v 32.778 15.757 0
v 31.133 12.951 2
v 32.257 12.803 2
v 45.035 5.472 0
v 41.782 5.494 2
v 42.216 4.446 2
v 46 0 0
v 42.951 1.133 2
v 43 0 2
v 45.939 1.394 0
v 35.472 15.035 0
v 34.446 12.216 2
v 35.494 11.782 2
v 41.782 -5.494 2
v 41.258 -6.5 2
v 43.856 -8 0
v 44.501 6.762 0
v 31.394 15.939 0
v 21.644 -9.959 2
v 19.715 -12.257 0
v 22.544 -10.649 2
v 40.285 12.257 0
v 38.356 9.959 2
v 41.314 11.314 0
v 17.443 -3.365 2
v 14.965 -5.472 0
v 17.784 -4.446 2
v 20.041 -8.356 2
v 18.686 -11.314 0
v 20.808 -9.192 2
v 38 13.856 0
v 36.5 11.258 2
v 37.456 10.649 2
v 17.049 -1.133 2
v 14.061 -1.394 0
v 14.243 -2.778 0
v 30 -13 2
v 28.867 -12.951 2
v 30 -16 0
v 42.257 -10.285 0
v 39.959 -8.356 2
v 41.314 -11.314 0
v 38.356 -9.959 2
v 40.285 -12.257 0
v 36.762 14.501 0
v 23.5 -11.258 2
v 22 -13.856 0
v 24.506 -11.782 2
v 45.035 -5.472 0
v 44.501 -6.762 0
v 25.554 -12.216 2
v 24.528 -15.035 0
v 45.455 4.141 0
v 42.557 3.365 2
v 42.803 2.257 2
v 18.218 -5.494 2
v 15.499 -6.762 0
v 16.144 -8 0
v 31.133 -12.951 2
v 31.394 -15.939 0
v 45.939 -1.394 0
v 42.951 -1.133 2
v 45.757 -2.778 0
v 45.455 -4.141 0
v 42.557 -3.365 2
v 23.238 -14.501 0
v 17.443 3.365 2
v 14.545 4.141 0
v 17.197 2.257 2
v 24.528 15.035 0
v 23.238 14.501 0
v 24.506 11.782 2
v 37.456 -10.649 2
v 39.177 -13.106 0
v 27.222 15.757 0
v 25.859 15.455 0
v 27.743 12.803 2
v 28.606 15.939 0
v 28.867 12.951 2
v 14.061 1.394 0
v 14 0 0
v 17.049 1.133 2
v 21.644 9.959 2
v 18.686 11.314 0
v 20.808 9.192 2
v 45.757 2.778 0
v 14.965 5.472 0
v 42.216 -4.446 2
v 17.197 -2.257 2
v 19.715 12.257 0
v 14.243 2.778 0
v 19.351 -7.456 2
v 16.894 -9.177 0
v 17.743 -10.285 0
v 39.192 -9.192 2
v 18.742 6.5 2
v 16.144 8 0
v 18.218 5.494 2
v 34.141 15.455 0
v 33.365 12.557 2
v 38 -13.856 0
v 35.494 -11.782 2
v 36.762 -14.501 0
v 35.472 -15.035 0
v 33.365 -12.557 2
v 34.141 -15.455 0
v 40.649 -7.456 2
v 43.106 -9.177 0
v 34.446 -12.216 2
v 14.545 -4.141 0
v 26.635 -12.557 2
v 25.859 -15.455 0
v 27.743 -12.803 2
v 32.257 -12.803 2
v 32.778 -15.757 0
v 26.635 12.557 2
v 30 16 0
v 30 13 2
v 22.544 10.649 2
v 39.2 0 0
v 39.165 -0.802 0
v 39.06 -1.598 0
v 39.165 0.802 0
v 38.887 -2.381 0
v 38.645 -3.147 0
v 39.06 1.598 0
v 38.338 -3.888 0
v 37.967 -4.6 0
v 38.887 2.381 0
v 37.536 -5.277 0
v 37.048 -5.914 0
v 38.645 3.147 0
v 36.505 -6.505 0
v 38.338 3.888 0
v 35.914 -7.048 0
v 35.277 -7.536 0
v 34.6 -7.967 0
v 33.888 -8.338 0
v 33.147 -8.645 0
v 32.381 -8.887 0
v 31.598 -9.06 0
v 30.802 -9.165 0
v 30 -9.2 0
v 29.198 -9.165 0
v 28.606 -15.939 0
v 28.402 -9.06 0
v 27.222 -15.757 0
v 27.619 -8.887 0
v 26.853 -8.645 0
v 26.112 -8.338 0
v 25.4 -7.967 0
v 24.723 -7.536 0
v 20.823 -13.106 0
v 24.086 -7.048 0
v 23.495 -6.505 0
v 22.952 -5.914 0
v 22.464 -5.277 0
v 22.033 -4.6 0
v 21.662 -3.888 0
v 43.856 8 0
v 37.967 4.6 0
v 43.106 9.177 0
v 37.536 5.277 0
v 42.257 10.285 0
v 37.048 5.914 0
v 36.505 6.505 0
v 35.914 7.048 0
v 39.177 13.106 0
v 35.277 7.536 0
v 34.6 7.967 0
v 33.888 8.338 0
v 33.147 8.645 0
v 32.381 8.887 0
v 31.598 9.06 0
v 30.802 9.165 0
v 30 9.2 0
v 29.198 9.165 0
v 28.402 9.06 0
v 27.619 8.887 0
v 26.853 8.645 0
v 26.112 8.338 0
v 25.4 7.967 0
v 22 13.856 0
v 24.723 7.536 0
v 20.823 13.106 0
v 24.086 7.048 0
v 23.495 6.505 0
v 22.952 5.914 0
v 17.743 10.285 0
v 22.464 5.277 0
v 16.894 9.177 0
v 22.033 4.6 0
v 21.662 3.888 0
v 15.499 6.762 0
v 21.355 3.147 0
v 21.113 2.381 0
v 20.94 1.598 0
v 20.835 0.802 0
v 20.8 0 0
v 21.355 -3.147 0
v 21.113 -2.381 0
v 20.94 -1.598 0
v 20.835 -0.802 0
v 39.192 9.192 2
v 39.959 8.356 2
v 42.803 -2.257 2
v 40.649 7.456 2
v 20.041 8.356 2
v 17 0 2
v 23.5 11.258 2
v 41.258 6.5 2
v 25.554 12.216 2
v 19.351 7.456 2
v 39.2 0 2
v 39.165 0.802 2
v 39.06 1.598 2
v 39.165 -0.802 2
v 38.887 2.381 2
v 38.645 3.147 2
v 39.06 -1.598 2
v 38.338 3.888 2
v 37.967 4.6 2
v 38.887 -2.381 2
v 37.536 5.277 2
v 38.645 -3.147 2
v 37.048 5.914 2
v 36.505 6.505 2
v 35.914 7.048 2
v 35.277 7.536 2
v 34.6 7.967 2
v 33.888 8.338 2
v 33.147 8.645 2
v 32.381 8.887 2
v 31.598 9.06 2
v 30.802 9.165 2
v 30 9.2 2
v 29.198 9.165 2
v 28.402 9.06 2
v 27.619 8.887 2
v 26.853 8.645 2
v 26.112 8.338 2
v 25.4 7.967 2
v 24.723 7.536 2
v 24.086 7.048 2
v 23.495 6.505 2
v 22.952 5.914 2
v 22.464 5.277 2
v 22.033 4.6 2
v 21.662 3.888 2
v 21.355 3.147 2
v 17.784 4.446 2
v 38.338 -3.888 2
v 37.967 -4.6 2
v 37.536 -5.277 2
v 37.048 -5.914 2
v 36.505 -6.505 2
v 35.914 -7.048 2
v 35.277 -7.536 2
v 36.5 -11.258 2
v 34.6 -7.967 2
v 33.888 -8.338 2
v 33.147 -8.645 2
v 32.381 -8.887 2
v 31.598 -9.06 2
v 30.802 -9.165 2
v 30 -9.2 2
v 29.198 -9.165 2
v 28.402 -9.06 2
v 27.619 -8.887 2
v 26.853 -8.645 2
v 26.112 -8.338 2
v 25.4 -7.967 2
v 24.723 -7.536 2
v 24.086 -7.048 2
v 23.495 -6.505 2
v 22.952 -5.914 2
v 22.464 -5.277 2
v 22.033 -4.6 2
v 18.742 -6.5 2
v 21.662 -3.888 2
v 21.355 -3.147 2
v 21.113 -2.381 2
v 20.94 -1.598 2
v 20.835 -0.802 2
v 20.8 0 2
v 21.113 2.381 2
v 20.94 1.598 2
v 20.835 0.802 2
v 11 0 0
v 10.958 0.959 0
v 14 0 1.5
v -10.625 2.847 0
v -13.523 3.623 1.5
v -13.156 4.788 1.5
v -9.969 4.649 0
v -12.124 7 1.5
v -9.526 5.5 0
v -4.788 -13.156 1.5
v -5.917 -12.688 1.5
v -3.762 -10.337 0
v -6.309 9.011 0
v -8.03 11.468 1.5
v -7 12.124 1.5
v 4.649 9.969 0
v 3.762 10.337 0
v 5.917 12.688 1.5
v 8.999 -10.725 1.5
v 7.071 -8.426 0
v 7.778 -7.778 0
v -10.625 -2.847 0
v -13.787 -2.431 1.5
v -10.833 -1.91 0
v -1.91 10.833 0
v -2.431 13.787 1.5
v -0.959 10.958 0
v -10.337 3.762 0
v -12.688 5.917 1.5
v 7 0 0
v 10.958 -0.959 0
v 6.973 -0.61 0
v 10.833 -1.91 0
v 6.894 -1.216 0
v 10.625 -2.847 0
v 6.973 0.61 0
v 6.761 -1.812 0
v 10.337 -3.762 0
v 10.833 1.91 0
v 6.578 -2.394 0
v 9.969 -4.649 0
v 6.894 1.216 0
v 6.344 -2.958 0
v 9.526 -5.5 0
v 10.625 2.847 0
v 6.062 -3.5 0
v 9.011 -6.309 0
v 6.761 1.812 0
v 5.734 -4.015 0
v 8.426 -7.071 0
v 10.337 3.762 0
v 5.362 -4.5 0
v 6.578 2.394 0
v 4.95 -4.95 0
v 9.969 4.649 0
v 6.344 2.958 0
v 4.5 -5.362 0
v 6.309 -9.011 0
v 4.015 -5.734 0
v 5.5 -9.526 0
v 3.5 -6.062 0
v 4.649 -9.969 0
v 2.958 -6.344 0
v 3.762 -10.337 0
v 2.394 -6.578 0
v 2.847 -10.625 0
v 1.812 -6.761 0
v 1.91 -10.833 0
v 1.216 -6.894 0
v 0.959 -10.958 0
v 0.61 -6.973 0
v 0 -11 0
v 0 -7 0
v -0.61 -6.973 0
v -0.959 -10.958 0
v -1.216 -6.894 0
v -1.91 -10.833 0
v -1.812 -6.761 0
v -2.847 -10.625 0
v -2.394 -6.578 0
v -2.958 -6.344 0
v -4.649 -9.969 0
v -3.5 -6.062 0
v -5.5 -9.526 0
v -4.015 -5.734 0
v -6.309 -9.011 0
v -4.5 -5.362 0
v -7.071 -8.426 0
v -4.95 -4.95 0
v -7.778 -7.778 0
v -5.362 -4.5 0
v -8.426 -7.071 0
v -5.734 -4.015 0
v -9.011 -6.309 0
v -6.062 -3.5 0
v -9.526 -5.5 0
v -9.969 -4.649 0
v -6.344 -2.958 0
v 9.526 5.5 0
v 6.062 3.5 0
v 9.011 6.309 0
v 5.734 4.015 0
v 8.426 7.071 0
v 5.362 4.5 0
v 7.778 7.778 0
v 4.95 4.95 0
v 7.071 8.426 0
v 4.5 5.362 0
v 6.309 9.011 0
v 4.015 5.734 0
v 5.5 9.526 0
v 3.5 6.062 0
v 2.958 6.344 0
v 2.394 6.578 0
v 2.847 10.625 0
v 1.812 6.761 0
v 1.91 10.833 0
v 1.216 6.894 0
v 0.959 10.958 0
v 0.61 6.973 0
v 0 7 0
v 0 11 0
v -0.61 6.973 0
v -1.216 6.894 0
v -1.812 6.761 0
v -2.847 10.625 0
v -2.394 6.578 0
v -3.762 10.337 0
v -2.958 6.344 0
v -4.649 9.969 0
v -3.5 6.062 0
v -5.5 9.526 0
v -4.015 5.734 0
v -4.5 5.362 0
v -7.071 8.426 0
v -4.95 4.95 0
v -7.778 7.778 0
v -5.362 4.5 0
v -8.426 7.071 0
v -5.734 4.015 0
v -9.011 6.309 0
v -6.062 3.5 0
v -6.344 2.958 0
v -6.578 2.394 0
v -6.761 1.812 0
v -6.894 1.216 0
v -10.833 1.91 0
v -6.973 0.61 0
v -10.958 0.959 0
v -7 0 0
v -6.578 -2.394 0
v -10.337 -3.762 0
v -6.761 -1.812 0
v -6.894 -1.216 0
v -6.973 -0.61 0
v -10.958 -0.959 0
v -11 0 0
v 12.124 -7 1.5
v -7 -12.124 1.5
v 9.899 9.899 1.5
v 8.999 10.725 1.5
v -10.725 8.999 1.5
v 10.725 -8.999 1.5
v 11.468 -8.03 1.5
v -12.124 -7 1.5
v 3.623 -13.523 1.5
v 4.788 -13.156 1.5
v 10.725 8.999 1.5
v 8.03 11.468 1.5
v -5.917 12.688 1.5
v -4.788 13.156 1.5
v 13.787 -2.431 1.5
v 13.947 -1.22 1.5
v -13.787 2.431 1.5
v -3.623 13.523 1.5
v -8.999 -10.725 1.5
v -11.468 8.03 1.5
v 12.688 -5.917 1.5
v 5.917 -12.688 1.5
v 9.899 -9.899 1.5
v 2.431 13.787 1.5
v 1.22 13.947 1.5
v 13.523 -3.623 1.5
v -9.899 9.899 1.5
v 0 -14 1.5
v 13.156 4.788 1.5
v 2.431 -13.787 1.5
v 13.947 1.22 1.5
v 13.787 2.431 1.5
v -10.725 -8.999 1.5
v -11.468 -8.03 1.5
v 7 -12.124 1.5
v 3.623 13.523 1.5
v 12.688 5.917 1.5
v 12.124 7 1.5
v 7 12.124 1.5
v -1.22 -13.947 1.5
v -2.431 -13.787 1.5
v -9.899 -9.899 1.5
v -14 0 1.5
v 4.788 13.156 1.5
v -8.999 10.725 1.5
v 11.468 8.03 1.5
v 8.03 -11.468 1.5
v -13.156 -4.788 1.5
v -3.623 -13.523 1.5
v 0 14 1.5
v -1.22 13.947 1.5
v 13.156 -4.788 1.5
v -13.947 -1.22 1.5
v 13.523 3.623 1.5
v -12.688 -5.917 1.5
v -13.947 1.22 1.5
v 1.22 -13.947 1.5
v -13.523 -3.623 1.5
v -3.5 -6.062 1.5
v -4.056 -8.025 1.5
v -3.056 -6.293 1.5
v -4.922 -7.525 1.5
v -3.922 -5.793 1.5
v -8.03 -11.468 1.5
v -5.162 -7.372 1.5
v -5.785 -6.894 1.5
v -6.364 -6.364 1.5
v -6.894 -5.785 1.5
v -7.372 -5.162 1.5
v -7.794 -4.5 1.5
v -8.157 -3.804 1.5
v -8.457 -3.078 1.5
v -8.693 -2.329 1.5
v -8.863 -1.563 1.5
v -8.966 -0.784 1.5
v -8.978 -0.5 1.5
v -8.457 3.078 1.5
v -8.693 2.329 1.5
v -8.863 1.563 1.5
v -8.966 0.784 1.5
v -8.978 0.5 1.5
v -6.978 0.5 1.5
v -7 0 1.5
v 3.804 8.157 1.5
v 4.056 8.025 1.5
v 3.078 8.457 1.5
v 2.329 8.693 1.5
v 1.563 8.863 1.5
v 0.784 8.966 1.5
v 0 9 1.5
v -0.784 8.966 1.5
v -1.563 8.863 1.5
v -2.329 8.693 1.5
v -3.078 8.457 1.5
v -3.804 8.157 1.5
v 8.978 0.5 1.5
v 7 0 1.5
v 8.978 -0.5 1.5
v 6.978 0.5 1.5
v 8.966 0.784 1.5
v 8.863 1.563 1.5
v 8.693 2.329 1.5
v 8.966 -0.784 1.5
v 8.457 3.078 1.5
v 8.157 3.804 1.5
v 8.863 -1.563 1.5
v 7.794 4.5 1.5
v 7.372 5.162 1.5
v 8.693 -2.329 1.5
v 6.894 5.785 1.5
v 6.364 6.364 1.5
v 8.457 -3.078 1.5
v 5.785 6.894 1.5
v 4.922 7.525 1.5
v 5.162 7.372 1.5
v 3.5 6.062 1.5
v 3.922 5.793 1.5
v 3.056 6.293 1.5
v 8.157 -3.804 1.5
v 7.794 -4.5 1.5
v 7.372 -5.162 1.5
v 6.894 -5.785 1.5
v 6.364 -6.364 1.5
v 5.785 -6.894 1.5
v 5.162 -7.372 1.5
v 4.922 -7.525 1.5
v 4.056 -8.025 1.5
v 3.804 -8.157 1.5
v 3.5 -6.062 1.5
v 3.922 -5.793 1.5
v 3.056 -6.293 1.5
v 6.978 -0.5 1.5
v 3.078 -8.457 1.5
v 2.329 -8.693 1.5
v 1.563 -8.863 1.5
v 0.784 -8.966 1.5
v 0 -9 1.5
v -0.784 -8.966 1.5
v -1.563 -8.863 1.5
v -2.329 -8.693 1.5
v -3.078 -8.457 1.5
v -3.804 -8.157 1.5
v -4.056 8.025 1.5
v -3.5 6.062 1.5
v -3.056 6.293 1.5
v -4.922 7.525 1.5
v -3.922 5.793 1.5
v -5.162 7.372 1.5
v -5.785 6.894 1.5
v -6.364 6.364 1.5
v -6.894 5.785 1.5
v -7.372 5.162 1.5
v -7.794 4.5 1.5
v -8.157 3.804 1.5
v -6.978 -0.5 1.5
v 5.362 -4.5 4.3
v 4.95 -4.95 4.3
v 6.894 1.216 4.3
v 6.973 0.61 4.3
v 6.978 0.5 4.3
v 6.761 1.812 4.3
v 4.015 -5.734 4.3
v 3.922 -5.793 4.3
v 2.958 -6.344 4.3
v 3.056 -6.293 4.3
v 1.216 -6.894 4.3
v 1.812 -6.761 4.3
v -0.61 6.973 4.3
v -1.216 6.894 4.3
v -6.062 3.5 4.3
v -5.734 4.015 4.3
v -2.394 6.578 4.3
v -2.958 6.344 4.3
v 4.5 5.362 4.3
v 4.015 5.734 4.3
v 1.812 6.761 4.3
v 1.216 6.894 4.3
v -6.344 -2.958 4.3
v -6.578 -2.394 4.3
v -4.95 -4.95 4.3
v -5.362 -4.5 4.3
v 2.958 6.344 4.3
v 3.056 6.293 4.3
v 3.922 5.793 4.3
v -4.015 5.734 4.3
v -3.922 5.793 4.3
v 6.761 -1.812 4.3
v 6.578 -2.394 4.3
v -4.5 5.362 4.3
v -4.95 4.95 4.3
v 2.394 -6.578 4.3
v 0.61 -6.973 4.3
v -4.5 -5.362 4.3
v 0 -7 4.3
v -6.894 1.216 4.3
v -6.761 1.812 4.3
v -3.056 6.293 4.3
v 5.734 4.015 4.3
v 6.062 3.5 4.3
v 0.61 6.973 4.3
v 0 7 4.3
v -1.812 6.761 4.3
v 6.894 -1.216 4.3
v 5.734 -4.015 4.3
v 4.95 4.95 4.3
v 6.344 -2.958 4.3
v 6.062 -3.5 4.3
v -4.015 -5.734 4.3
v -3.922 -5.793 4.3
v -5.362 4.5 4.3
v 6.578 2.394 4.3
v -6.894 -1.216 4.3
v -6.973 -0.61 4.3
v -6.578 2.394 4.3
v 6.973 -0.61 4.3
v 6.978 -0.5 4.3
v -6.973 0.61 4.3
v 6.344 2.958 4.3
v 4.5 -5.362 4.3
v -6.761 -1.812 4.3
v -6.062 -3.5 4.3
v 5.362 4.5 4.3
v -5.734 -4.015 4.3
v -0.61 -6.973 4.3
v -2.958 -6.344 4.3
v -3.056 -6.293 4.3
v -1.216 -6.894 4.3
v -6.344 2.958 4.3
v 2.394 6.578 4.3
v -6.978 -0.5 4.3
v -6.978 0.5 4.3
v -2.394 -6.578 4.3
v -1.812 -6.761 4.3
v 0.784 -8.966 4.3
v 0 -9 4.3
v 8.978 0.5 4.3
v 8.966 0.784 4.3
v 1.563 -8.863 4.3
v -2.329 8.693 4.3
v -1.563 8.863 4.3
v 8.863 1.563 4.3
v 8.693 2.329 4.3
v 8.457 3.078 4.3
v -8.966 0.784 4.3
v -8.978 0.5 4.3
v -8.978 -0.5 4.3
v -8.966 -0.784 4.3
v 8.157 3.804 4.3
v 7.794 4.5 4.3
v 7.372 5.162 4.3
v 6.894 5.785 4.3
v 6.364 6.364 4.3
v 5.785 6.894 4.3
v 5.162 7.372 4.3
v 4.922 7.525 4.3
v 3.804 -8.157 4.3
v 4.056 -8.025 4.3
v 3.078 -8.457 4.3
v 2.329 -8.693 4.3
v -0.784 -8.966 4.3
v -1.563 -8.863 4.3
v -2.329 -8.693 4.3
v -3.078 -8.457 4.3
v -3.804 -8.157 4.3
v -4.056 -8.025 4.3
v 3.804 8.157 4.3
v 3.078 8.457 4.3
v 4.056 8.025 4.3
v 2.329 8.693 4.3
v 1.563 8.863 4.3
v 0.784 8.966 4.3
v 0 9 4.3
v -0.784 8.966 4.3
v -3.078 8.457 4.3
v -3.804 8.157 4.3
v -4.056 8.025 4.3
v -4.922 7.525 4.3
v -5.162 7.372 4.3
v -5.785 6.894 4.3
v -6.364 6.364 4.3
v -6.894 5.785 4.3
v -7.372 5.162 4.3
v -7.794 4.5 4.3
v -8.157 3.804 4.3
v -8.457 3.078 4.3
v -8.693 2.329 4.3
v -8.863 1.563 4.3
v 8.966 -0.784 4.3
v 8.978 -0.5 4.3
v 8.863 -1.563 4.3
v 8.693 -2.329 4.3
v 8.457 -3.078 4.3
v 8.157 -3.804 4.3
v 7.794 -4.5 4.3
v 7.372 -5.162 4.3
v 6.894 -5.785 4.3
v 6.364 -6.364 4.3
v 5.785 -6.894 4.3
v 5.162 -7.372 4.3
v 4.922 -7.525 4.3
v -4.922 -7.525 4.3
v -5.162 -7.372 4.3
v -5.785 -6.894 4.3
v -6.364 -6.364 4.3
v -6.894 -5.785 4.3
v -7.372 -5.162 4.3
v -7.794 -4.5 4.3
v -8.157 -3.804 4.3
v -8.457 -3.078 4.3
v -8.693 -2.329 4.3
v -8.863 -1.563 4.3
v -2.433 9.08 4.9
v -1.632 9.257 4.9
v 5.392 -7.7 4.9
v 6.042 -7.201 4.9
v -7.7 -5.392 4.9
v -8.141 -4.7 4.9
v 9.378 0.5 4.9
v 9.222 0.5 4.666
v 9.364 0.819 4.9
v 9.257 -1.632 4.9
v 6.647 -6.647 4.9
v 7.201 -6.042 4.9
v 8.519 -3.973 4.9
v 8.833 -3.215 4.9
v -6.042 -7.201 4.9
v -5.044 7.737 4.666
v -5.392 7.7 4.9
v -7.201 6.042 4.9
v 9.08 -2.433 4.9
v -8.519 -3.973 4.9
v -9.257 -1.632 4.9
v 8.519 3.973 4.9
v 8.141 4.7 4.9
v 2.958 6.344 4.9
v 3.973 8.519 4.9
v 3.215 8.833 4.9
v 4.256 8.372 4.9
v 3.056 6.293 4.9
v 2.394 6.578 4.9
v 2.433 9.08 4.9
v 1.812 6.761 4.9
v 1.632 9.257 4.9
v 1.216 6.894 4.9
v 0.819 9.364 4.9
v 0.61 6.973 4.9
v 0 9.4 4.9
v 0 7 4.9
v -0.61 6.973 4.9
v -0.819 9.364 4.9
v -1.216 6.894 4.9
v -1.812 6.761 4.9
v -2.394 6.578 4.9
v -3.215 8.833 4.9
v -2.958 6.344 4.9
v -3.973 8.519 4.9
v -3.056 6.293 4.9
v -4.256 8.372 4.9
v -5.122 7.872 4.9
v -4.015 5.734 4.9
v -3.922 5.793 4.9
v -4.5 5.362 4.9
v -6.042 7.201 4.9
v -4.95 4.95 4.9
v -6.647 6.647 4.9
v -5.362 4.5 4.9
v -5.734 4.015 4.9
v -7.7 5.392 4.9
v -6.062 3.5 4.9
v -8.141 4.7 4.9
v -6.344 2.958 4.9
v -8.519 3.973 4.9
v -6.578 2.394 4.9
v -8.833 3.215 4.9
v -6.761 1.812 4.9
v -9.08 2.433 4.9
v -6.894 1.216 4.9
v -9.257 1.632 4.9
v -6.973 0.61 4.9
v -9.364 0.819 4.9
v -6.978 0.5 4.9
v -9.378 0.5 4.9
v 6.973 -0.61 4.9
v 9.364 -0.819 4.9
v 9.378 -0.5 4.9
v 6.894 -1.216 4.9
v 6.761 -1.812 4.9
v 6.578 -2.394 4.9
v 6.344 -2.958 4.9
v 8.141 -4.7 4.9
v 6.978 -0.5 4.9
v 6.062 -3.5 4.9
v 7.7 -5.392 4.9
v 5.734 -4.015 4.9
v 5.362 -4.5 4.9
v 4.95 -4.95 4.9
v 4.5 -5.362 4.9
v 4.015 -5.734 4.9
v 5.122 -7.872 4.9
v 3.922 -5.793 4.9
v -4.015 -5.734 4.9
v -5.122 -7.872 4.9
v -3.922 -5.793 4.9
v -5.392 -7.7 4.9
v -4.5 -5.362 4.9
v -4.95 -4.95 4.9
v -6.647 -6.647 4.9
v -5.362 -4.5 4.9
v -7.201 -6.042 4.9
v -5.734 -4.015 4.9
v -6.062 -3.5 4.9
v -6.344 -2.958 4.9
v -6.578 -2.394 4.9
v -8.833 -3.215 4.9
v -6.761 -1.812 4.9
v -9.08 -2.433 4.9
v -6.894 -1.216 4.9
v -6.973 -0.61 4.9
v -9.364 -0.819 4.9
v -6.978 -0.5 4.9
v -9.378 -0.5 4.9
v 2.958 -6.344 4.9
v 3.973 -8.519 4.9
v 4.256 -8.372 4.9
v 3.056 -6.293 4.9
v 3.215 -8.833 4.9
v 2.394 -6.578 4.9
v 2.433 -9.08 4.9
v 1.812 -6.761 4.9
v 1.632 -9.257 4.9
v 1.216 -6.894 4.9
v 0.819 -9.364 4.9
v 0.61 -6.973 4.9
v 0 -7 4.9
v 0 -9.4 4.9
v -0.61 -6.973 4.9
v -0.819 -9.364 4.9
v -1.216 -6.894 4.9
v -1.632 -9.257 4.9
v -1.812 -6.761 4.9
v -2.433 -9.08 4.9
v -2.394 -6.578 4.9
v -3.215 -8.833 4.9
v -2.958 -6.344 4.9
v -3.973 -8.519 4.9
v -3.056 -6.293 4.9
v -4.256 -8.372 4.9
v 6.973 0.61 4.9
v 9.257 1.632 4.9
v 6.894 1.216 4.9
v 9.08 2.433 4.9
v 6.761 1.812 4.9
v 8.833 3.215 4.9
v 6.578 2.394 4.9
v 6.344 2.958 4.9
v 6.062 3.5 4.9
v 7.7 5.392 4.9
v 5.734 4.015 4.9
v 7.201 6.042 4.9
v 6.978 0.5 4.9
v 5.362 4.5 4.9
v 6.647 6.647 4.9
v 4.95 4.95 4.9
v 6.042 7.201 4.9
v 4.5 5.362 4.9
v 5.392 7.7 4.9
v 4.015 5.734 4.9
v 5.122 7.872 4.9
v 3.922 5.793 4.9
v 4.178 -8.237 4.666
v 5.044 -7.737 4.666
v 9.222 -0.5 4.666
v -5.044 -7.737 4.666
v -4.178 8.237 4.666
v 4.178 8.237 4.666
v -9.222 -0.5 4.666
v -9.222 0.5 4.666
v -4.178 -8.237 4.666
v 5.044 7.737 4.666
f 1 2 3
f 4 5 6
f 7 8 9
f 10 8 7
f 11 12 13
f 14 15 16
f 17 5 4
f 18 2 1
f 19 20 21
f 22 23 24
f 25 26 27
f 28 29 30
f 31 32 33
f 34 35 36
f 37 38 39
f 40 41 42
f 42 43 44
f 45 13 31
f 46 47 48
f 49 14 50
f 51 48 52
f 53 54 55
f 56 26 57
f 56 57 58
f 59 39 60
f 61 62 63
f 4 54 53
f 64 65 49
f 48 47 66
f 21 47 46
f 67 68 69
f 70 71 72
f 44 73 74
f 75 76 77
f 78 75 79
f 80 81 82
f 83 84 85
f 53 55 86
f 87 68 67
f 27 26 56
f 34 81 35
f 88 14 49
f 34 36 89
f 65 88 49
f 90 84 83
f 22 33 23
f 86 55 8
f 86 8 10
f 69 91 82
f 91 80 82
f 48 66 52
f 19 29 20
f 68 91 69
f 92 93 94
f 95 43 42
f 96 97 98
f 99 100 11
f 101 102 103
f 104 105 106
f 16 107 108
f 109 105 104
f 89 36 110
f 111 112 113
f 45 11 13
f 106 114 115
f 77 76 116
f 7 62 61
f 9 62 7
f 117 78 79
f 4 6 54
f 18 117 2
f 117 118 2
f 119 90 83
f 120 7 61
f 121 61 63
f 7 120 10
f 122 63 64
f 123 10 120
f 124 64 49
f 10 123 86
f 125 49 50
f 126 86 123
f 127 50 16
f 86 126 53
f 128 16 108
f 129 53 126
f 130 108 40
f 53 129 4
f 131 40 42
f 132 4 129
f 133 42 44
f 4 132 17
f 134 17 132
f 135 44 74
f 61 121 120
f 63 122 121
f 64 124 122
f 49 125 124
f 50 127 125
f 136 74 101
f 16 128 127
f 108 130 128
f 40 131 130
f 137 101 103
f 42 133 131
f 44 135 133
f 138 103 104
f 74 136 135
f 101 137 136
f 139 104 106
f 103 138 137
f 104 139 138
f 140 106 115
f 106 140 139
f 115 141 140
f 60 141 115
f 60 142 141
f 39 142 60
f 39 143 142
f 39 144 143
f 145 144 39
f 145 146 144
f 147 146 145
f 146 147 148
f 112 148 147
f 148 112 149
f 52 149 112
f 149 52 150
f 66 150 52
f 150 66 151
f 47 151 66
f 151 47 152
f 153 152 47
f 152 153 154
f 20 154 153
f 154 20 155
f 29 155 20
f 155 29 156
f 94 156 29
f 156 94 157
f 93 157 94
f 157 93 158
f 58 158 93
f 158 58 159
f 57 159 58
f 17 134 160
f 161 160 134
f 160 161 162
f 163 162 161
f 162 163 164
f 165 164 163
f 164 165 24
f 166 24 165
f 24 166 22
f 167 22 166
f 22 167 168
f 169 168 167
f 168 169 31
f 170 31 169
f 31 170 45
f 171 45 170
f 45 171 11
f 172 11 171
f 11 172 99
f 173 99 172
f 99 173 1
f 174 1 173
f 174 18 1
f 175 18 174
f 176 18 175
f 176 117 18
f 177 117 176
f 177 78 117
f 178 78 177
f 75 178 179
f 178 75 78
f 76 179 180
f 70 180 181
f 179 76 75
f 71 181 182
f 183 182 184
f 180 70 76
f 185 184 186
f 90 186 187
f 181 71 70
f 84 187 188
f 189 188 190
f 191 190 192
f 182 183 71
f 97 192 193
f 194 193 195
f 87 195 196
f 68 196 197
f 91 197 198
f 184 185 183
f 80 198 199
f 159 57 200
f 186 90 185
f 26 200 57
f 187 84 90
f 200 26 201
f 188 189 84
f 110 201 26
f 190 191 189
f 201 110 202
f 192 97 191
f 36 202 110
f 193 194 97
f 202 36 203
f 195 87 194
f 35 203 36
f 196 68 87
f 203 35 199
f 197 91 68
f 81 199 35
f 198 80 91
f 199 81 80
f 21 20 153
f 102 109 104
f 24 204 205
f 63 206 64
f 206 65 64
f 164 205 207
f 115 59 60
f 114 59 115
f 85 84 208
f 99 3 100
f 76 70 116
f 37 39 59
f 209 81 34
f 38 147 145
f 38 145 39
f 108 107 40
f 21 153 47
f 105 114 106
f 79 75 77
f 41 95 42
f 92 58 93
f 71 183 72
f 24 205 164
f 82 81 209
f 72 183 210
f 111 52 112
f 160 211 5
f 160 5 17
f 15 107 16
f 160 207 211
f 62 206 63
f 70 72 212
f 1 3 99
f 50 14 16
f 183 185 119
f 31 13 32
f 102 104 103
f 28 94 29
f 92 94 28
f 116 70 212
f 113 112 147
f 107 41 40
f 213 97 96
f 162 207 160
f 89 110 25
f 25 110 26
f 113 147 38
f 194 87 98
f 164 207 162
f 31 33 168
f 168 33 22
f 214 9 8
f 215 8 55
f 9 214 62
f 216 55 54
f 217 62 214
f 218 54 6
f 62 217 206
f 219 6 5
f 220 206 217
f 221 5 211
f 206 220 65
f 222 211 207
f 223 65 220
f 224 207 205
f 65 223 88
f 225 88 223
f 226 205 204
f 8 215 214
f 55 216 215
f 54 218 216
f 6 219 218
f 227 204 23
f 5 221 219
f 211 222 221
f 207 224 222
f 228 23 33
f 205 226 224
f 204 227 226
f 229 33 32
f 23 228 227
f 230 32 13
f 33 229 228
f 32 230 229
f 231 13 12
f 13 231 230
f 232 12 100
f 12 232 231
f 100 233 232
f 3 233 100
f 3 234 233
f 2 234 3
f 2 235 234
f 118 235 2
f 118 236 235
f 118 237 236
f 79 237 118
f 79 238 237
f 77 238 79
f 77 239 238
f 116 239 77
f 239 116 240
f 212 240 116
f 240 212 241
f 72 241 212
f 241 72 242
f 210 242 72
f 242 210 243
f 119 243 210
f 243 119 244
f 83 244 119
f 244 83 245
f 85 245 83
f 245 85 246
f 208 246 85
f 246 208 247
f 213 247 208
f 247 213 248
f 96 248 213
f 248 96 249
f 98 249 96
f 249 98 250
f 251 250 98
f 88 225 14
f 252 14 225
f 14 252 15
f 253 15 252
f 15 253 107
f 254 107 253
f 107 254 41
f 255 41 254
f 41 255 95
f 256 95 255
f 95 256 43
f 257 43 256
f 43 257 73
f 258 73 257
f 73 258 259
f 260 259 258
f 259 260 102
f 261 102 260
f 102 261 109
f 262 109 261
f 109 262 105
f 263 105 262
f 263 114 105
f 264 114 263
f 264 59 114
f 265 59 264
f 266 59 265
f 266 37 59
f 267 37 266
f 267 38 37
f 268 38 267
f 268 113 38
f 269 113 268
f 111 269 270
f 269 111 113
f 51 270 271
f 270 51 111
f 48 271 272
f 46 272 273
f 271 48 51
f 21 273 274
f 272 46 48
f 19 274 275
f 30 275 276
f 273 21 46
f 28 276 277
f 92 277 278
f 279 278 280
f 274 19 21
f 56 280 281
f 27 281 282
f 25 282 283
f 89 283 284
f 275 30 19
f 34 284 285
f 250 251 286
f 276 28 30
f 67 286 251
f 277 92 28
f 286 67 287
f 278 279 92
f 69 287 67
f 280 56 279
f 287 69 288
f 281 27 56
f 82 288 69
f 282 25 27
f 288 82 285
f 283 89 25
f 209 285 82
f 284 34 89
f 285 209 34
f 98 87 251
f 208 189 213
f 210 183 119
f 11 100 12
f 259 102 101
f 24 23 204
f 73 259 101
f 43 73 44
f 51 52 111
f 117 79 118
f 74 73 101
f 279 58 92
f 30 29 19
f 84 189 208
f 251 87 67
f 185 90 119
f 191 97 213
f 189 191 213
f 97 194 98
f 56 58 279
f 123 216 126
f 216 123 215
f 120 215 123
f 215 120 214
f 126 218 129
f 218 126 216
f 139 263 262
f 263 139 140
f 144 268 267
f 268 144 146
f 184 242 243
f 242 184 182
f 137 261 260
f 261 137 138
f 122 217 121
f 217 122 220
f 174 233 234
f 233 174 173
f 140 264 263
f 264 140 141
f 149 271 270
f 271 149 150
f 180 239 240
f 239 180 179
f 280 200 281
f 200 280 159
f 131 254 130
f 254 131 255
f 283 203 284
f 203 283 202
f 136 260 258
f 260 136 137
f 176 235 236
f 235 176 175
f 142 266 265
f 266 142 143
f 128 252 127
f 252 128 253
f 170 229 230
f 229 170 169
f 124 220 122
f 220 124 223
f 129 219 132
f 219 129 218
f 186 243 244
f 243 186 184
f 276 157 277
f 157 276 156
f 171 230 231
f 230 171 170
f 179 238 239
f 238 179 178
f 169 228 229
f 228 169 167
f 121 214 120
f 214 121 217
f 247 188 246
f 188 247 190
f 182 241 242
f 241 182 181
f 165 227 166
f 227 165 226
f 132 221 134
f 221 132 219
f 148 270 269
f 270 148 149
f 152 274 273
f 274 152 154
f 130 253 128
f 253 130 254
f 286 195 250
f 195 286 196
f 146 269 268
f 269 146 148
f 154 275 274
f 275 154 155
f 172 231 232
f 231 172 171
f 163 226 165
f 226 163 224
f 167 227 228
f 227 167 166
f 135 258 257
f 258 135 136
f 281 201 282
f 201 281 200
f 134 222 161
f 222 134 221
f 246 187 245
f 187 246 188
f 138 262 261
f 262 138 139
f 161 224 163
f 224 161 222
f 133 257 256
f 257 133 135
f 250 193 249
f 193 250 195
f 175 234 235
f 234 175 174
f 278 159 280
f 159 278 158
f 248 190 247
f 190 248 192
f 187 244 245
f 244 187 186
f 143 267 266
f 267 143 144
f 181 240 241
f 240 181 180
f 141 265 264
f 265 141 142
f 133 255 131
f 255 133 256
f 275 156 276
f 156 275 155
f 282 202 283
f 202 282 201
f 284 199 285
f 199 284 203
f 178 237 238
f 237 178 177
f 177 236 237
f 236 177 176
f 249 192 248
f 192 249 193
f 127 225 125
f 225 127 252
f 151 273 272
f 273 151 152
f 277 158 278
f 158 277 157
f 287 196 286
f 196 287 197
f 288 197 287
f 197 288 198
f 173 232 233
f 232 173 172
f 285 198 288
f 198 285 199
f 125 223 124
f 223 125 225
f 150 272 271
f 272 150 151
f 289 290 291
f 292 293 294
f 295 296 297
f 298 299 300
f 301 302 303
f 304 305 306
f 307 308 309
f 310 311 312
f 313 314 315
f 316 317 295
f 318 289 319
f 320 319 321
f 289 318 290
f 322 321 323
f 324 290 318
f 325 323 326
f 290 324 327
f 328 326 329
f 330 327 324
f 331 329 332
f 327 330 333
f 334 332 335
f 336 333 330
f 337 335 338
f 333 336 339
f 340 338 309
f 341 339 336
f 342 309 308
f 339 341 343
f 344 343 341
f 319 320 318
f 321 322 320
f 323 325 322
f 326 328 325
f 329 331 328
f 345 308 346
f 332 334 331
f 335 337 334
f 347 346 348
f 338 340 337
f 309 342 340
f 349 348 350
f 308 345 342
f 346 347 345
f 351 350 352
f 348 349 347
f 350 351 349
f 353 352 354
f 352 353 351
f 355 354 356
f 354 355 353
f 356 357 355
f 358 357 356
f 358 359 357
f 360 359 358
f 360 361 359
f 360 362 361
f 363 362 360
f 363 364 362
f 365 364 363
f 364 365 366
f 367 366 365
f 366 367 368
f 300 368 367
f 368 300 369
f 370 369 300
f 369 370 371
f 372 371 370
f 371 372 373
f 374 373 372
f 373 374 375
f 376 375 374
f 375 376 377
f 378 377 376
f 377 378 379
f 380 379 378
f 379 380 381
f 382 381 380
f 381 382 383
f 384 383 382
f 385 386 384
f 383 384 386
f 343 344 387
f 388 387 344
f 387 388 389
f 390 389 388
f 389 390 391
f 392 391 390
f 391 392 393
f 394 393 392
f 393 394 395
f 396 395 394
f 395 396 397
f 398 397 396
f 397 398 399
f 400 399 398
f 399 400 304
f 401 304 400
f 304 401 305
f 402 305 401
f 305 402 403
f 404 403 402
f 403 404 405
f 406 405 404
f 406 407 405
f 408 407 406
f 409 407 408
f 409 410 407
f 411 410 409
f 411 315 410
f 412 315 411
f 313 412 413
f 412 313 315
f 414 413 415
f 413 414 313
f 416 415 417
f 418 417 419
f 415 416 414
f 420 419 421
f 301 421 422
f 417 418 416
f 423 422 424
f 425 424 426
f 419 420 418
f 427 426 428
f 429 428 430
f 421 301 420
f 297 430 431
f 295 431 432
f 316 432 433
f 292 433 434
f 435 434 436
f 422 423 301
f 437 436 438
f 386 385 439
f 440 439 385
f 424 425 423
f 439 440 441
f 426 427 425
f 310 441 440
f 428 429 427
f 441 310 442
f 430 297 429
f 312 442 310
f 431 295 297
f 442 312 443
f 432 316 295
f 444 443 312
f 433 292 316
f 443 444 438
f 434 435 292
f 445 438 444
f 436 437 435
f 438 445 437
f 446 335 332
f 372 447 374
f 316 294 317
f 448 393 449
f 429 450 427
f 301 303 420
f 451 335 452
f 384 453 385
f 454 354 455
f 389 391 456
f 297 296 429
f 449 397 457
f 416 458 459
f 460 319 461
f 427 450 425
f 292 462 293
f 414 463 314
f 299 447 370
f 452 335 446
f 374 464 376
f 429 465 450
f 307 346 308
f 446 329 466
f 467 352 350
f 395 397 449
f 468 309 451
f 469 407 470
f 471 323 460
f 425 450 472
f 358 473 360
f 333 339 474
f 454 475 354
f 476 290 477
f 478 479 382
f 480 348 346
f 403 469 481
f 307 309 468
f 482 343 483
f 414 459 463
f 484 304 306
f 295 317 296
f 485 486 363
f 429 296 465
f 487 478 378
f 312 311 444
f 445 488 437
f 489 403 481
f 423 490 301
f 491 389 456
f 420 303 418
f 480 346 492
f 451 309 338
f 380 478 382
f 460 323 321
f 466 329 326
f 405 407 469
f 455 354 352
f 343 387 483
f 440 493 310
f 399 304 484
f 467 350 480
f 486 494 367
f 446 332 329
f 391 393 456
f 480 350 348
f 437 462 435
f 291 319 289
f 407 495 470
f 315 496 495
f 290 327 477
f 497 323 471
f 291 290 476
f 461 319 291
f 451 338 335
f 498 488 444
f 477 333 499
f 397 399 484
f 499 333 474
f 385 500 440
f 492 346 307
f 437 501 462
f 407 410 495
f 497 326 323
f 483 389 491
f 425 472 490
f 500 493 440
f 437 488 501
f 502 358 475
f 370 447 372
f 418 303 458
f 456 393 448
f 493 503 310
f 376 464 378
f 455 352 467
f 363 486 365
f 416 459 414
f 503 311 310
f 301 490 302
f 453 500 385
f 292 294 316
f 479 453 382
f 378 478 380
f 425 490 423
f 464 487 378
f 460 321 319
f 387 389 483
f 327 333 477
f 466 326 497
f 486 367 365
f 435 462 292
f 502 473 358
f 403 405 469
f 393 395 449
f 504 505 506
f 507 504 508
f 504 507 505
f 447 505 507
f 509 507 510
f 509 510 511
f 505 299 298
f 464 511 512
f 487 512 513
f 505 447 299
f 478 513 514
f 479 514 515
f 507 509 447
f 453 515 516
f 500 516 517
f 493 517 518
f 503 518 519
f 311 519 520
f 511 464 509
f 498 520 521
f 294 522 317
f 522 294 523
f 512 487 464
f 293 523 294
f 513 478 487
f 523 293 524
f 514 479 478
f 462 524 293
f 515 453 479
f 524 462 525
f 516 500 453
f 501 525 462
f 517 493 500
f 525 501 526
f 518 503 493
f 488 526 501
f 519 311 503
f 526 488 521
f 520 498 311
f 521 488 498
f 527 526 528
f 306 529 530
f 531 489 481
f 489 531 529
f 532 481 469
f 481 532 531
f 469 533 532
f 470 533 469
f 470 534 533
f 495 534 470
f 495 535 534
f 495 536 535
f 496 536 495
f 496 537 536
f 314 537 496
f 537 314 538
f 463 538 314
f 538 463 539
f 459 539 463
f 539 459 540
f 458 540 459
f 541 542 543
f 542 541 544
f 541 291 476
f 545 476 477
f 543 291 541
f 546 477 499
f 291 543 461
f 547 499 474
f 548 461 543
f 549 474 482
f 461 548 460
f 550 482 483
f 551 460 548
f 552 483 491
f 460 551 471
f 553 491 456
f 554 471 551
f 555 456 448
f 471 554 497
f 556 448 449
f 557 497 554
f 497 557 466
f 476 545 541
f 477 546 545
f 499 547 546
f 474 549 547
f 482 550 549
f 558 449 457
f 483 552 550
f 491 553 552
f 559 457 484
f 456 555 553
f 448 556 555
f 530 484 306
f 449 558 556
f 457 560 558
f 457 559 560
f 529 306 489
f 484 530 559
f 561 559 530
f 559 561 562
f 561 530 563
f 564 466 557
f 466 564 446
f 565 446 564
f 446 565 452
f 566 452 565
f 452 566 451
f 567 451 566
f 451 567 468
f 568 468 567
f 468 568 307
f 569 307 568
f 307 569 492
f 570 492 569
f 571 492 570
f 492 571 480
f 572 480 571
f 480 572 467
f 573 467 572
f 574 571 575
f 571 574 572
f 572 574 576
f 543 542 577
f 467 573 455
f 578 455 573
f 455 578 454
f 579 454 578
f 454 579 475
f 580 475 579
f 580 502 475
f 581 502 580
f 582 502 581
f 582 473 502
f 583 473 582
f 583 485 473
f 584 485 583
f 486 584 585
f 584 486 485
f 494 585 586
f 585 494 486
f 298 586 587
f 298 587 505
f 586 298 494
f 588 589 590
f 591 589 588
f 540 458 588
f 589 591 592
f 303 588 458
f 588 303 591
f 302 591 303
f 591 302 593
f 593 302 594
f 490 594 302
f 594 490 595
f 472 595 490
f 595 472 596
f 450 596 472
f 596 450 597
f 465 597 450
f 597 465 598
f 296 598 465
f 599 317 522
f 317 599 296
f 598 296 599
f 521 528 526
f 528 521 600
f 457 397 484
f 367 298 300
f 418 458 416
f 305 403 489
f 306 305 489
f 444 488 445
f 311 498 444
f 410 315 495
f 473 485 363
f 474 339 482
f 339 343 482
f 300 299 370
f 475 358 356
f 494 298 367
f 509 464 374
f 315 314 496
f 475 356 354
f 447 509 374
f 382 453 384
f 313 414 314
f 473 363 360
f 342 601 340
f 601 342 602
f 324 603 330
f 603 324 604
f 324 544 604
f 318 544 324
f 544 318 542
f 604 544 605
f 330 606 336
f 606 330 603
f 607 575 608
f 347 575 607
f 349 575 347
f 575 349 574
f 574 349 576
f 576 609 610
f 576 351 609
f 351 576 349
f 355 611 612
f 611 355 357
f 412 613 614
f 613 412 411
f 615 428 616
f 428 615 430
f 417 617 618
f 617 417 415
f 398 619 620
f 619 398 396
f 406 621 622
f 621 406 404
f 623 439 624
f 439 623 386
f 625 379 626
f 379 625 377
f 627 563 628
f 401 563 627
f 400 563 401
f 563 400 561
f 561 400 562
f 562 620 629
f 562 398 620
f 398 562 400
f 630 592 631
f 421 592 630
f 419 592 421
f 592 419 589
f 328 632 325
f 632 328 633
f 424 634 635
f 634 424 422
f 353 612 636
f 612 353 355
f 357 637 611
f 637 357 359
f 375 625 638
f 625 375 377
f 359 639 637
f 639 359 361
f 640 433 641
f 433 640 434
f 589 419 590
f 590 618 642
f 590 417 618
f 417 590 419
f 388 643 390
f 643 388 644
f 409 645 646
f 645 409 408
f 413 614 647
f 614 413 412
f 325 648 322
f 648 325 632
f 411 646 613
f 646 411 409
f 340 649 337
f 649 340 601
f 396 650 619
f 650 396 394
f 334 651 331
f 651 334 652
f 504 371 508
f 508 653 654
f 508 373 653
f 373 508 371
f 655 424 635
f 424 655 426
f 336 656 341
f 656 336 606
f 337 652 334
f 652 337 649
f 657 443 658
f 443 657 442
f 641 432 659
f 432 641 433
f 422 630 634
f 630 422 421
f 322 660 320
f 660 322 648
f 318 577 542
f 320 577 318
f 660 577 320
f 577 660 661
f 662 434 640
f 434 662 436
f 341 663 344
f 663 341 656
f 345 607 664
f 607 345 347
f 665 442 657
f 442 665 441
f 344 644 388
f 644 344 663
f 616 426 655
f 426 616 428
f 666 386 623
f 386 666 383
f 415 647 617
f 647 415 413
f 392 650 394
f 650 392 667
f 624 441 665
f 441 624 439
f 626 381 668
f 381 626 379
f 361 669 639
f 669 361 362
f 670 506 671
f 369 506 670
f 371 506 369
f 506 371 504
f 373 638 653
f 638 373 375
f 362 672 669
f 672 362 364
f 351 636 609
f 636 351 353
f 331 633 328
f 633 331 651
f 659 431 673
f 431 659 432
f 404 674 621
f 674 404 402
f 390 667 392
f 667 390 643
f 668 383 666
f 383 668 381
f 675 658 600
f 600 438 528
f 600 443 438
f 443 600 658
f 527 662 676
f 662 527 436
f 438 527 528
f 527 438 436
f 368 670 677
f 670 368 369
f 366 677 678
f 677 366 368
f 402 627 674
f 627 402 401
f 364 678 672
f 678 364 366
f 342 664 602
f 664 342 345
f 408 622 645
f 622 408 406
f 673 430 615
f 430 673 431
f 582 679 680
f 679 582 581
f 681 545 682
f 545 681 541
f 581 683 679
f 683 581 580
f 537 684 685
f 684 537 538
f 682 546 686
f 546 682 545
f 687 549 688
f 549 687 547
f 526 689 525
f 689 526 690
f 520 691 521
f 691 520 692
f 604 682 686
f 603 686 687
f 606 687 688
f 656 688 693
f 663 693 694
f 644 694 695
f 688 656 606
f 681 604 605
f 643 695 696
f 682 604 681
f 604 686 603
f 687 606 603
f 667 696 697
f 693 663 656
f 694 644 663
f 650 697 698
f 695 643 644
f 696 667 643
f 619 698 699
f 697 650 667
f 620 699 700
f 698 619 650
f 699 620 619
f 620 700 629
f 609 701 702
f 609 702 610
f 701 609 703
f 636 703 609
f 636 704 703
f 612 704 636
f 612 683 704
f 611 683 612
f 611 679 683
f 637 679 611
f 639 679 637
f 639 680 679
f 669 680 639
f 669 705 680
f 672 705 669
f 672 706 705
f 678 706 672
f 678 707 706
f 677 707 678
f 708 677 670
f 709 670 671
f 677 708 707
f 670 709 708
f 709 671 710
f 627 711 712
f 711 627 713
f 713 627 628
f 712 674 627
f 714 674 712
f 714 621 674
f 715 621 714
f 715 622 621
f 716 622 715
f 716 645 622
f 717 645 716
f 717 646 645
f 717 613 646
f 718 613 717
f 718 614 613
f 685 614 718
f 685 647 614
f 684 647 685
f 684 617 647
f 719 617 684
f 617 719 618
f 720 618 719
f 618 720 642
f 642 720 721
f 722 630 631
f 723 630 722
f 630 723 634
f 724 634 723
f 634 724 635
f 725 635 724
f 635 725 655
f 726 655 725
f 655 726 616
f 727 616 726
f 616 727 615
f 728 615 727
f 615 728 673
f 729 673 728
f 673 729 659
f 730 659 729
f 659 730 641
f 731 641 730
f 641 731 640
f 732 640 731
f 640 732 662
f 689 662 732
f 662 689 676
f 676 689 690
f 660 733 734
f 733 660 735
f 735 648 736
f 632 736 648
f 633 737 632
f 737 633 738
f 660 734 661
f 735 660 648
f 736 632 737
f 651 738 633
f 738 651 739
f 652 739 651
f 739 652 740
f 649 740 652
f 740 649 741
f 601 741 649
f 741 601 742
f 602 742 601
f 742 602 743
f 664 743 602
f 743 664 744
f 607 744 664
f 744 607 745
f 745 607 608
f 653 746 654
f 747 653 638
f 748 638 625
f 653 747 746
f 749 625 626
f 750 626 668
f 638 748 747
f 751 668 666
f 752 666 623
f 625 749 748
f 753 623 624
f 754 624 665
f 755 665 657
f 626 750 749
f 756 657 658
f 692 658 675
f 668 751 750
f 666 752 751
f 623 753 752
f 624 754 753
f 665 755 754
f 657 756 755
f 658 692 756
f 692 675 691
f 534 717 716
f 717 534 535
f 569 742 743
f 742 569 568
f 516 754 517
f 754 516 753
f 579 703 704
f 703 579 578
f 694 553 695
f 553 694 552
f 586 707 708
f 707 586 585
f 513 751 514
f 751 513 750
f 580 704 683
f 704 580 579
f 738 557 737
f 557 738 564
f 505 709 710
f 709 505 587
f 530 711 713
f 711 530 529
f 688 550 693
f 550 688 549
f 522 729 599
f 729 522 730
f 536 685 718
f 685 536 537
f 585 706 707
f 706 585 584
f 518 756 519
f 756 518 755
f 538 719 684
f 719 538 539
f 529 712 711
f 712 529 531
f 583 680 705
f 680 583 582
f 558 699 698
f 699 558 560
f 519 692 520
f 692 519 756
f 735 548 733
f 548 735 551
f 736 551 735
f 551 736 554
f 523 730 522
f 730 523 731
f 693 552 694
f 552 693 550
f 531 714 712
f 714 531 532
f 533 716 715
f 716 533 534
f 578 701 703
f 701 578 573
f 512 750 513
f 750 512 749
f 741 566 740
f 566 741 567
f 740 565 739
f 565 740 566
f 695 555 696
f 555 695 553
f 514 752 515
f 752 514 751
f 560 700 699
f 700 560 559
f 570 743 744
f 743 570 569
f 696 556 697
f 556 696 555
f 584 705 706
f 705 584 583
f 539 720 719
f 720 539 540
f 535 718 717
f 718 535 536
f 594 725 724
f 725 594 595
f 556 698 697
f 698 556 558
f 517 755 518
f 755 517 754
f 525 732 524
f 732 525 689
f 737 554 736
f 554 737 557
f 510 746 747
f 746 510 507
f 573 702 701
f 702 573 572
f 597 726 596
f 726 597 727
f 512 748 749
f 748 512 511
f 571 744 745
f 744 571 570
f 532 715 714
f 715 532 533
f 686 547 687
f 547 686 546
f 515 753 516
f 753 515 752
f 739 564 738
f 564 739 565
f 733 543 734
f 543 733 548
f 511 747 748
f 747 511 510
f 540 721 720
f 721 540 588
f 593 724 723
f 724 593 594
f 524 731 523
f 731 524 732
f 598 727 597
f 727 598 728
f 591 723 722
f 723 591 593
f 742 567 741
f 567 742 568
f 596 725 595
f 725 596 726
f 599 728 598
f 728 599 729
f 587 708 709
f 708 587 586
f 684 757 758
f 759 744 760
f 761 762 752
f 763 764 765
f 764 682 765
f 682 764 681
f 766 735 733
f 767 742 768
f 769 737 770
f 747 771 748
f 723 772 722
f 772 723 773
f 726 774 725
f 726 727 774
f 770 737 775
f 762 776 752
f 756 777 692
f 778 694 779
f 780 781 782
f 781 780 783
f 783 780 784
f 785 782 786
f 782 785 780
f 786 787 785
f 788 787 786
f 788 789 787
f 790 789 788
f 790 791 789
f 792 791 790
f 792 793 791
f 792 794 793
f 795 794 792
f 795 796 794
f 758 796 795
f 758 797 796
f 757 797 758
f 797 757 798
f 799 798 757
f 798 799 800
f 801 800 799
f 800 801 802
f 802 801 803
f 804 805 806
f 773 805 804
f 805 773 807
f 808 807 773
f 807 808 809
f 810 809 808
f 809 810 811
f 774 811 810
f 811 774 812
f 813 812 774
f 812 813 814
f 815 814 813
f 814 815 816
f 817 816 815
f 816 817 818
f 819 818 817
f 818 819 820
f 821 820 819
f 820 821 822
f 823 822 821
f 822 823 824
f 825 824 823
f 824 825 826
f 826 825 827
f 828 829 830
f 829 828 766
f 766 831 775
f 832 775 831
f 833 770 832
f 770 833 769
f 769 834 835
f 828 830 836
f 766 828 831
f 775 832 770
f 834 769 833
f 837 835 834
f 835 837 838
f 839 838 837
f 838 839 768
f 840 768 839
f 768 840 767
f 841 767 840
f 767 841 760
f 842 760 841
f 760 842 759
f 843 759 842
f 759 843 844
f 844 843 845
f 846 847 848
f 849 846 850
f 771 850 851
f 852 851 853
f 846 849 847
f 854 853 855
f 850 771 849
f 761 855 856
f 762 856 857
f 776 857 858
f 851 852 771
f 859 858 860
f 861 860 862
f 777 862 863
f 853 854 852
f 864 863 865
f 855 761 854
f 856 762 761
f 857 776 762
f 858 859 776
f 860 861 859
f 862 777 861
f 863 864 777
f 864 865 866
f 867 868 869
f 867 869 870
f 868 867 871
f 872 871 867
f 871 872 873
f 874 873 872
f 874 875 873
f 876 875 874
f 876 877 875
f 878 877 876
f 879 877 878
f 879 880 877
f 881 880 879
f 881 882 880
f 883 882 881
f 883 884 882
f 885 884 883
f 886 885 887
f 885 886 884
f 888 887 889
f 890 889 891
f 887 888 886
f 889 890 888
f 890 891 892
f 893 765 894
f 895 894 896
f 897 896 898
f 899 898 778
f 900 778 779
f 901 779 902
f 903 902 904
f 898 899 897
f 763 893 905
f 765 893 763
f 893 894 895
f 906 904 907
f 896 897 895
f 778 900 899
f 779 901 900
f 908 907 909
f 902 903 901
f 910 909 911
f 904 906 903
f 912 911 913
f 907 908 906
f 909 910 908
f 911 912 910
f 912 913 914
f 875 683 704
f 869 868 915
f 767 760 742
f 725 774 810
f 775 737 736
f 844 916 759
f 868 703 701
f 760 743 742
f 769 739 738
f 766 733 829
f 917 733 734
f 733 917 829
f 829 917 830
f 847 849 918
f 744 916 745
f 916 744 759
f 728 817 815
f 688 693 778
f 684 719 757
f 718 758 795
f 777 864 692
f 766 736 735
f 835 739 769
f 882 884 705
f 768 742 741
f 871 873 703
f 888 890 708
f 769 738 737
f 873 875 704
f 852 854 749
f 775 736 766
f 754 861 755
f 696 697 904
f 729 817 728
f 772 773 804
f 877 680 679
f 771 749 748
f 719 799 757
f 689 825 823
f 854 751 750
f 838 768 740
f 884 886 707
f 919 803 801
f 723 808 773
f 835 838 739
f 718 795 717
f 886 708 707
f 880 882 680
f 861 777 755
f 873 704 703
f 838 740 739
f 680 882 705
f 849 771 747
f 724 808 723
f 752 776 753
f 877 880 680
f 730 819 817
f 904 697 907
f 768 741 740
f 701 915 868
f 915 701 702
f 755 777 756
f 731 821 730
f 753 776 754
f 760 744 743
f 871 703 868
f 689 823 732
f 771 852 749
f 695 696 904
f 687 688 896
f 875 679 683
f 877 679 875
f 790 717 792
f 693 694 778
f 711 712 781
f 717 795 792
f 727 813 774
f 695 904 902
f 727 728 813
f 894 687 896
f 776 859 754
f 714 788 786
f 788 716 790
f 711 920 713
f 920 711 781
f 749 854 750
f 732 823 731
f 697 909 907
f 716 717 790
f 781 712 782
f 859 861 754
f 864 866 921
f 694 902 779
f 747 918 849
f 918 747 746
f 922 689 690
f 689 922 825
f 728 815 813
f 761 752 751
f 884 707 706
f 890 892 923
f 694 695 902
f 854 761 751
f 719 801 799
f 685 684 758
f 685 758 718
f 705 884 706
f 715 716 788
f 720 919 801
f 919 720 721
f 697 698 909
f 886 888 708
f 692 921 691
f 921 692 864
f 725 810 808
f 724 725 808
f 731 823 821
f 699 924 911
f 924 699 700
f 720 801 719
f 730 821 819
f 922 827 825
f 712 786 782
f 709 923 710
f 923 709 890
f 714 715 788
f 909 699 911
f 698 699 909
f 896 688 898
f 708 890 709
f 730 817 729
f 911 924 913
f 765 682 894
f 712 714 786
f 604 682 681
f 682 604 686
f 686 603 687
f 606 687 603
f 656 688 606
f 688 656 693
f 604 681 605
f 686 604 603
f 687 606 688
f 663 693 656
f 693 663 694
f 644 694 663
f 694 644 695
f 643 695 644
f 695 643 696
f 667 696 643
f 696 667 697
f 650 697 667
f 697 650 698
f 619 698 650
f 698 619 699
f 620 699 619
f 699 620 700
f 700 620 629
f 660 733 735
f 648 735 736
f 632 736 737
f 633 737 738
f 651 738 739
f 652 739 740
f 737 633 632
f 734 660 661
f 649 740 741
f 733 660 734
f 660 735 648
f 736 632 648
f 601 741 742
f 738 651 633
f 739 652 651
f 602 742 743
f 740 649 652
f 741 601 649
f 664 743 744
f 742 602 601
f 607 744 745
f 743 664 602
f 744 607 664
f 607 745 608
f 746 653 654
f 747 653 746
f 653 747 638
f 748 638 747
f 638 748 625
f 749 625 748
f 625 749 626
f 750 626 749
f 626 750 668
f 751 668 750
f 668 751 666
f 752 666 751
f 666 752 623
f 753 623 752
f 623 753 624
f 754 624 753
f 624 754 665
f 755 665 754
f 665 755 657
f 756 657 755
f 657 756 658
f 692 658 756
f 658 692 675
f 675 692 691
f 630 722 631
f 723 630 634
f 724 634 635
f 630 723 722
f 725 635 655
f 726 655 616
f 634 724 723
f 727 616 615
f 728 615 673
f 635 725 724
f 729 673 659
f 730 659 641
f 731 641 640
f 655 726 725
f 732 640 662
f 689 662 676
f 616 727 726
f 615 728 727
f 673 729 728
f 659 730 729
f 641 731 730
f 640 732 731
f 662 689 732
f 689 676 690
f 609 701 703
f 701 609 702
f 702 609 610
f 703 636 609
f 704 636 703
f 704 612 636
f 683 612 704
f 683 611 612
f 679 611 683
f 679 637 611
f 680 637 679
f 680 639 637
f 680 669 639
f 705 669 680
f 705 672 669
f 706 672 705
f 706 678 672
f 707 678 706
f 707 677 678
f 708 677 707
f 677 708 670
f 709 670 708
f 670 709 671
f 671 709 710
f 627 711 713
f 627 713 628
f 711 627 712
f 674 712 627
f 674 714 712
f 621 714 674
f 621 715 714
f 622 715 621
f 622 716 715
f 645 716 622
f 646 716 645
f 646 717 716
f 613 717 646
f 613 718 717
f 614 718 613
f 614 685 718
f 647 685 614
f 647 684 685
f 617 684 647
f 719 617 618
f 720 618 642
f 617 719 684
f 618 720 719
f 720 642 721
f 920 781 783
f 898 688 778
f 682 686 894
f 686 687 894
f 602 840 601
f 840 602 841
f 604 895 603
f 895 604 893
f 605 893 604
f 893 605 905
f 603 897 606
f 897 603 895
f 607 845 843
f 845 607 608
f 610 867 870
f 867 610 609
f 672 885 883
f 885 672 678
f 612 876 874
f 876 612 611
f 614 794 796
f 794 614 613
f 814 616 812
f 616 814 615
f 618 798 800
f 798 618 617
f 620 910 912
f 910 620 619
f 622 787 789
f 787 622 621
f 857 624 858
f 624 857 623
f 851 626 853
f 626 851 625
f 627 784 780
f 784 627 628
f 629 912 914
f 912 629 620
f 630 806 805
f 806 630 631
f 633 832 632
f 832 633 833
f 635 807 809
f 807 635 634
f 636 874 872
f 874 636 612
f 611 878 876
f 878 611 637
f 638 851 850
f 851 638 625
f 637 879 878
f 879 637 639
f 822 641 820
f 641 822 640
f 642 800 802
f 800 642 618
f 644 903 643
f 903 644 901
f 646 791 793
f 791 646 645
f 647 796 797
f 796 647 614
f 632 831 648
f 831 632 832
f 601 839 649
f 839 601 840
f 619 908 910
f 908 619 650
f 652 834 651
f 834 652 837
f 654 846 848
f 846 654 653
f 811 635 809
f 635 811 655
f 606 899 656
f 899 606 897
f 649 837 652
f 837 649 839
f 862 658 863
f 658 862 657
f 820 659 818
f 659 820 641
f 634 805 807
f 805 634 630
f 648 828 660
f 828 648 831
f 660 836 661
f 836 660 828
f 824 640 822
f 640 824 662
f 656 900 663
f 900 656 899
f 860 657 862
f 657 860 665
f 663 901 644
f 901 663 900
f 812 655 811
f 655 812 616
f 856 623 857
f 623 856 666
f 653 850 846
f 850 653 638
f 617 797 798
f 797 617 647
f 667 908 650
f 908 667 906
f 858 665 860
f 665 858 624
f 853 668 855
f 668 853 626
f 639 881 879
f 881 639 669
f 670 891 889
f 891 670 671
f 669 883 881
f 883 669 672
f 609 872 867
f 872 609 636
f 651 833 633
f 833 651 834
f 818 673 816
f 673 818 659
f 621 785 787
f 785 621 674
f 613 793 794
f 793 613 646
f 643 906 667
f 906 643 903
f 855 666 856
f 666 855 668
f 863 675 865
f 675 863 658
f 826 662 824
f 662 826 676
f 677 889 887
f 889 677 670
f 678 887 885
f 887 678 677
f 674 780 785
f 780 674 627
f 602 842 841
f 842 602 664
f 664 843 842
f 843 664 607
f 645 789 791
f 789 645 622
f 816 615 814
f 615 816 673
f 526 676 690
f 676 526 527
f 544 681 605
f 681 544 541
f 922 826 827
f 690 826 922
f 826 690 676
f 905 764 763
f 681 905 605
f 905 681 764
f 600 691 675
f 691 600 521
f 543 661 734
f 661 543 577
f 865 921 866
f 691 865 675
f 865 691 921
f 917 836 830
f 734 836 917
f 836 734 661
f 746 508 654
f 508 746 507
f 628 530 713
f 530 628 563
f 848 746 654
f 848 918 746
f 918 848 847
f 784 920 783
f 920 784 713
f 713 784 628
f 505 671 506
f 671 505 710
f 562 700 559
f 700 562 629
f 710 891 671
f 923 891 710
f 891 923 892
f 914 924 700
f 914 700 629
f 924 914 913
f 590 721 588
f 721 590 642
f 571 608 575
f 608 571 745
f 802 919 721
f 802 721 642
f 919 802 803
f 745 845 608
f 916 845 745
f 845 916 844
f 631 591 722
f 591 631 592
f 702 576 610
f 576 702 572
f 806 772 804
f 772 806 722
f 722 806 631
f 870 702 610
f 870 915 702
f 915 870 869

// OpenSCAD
$fn=72;

eyeletRingDiameterOffset = 0.2;
eyeletRingTopWidth = 4;
eyeletRingBottomWidth = 7;
eyeletRingHeight= 2;

eyeletDiameter = 14;
outerTopWidth = 7;
outerBottomWidth = 4;
baseHeigth = 1.5;

hookRingWidth=2;
hookRingHeight=2.8;

hookTopWidth = 0.5;
hookMiddleWidth=2.4;
hookTopHeight = 0.0;
hookMiddleHeight = 0.6;

numberOfSplits = 3;
hookSplitWidth = 1;


eyelet();

module eyelet() {
		translate([eyeletDiameter+max(outerBottomWidth,outerTopWidth)+max(eyeletRingTopWidth,eyeletRingBottomWidth)+2,0,0]) {

		difference() {


			cylinder(h=eyeletRingHeight,r1=eyeletDiameter/2+hookRingWidth+eyeletRingBottomWidth,r2=eyeletDiameter/2+hookRingWidth+eyeletRingTopWidth);
					translate([0,0,-0.1]) {
						cylinder(h=eyeletRingHeight+0.2,r=eyeletDiameter/2+hookRingWidth+eyeletRingDiameterOffset);
					}
			}
		}



		//-------------------BASE
		difference() {

		cylinder(h=baseHeigth,r1=eyeletDiameter/2+outerBottomWidth,r2=eyeletDiameter/2+outerTopWidth);

			translate([0,0,-0.1]) {
				cylinder(h=baseHeigth+0.2,r=eyeletDiameter/2);
			}
		}

		difference() {
		//-------------------HOOK RING

			union() {
				translate([0,0,baseHeigth]) {
				difference() {
				cylinder(h=hookRingHeight,r=eyeletDiameter/2+hookRingWidth);

				translate([0,0,-0.1]) {
					cylinder(h=hookRingHeight+0.2,r=eyeletDiameter/2);
				}}
				}


				//-------------------HOOK

				translate([0,0,baseHeigth+hookRingHeight]) {

				difference() {
					union() {
						cylinder(h=hookMiddleHeight,r1=eyeletDiameter/2+hookRingWidth,r2=eyeletDiameter/2+hookMiddleWidth);
						translate([0,0,hookMiddleHeight]) {
						cylinder(h=hookTopHeight,r1=eyeletDiameter/2+hookMiddleWidth,r2=eyeletDiameter/2+hookTopWidth);

						}
					}
					translate([0,0,-0.1]) {
						cylinder(h=hookMiddleHeight+hookTopHeight+0.2,r=eyeletDiameter/2);
					}
				}

				}
			}


		// HOOK SPLITS

			for(pos=[0:1:numberOfSplits]) {

				rotate([0,0,(180 / numberOfSplits)*pos]) {
					translate([0,0,baseHeigth+30]) {
					cube([500,hookSplitWidth,60],true);
					}
				}
			}
		}
}
